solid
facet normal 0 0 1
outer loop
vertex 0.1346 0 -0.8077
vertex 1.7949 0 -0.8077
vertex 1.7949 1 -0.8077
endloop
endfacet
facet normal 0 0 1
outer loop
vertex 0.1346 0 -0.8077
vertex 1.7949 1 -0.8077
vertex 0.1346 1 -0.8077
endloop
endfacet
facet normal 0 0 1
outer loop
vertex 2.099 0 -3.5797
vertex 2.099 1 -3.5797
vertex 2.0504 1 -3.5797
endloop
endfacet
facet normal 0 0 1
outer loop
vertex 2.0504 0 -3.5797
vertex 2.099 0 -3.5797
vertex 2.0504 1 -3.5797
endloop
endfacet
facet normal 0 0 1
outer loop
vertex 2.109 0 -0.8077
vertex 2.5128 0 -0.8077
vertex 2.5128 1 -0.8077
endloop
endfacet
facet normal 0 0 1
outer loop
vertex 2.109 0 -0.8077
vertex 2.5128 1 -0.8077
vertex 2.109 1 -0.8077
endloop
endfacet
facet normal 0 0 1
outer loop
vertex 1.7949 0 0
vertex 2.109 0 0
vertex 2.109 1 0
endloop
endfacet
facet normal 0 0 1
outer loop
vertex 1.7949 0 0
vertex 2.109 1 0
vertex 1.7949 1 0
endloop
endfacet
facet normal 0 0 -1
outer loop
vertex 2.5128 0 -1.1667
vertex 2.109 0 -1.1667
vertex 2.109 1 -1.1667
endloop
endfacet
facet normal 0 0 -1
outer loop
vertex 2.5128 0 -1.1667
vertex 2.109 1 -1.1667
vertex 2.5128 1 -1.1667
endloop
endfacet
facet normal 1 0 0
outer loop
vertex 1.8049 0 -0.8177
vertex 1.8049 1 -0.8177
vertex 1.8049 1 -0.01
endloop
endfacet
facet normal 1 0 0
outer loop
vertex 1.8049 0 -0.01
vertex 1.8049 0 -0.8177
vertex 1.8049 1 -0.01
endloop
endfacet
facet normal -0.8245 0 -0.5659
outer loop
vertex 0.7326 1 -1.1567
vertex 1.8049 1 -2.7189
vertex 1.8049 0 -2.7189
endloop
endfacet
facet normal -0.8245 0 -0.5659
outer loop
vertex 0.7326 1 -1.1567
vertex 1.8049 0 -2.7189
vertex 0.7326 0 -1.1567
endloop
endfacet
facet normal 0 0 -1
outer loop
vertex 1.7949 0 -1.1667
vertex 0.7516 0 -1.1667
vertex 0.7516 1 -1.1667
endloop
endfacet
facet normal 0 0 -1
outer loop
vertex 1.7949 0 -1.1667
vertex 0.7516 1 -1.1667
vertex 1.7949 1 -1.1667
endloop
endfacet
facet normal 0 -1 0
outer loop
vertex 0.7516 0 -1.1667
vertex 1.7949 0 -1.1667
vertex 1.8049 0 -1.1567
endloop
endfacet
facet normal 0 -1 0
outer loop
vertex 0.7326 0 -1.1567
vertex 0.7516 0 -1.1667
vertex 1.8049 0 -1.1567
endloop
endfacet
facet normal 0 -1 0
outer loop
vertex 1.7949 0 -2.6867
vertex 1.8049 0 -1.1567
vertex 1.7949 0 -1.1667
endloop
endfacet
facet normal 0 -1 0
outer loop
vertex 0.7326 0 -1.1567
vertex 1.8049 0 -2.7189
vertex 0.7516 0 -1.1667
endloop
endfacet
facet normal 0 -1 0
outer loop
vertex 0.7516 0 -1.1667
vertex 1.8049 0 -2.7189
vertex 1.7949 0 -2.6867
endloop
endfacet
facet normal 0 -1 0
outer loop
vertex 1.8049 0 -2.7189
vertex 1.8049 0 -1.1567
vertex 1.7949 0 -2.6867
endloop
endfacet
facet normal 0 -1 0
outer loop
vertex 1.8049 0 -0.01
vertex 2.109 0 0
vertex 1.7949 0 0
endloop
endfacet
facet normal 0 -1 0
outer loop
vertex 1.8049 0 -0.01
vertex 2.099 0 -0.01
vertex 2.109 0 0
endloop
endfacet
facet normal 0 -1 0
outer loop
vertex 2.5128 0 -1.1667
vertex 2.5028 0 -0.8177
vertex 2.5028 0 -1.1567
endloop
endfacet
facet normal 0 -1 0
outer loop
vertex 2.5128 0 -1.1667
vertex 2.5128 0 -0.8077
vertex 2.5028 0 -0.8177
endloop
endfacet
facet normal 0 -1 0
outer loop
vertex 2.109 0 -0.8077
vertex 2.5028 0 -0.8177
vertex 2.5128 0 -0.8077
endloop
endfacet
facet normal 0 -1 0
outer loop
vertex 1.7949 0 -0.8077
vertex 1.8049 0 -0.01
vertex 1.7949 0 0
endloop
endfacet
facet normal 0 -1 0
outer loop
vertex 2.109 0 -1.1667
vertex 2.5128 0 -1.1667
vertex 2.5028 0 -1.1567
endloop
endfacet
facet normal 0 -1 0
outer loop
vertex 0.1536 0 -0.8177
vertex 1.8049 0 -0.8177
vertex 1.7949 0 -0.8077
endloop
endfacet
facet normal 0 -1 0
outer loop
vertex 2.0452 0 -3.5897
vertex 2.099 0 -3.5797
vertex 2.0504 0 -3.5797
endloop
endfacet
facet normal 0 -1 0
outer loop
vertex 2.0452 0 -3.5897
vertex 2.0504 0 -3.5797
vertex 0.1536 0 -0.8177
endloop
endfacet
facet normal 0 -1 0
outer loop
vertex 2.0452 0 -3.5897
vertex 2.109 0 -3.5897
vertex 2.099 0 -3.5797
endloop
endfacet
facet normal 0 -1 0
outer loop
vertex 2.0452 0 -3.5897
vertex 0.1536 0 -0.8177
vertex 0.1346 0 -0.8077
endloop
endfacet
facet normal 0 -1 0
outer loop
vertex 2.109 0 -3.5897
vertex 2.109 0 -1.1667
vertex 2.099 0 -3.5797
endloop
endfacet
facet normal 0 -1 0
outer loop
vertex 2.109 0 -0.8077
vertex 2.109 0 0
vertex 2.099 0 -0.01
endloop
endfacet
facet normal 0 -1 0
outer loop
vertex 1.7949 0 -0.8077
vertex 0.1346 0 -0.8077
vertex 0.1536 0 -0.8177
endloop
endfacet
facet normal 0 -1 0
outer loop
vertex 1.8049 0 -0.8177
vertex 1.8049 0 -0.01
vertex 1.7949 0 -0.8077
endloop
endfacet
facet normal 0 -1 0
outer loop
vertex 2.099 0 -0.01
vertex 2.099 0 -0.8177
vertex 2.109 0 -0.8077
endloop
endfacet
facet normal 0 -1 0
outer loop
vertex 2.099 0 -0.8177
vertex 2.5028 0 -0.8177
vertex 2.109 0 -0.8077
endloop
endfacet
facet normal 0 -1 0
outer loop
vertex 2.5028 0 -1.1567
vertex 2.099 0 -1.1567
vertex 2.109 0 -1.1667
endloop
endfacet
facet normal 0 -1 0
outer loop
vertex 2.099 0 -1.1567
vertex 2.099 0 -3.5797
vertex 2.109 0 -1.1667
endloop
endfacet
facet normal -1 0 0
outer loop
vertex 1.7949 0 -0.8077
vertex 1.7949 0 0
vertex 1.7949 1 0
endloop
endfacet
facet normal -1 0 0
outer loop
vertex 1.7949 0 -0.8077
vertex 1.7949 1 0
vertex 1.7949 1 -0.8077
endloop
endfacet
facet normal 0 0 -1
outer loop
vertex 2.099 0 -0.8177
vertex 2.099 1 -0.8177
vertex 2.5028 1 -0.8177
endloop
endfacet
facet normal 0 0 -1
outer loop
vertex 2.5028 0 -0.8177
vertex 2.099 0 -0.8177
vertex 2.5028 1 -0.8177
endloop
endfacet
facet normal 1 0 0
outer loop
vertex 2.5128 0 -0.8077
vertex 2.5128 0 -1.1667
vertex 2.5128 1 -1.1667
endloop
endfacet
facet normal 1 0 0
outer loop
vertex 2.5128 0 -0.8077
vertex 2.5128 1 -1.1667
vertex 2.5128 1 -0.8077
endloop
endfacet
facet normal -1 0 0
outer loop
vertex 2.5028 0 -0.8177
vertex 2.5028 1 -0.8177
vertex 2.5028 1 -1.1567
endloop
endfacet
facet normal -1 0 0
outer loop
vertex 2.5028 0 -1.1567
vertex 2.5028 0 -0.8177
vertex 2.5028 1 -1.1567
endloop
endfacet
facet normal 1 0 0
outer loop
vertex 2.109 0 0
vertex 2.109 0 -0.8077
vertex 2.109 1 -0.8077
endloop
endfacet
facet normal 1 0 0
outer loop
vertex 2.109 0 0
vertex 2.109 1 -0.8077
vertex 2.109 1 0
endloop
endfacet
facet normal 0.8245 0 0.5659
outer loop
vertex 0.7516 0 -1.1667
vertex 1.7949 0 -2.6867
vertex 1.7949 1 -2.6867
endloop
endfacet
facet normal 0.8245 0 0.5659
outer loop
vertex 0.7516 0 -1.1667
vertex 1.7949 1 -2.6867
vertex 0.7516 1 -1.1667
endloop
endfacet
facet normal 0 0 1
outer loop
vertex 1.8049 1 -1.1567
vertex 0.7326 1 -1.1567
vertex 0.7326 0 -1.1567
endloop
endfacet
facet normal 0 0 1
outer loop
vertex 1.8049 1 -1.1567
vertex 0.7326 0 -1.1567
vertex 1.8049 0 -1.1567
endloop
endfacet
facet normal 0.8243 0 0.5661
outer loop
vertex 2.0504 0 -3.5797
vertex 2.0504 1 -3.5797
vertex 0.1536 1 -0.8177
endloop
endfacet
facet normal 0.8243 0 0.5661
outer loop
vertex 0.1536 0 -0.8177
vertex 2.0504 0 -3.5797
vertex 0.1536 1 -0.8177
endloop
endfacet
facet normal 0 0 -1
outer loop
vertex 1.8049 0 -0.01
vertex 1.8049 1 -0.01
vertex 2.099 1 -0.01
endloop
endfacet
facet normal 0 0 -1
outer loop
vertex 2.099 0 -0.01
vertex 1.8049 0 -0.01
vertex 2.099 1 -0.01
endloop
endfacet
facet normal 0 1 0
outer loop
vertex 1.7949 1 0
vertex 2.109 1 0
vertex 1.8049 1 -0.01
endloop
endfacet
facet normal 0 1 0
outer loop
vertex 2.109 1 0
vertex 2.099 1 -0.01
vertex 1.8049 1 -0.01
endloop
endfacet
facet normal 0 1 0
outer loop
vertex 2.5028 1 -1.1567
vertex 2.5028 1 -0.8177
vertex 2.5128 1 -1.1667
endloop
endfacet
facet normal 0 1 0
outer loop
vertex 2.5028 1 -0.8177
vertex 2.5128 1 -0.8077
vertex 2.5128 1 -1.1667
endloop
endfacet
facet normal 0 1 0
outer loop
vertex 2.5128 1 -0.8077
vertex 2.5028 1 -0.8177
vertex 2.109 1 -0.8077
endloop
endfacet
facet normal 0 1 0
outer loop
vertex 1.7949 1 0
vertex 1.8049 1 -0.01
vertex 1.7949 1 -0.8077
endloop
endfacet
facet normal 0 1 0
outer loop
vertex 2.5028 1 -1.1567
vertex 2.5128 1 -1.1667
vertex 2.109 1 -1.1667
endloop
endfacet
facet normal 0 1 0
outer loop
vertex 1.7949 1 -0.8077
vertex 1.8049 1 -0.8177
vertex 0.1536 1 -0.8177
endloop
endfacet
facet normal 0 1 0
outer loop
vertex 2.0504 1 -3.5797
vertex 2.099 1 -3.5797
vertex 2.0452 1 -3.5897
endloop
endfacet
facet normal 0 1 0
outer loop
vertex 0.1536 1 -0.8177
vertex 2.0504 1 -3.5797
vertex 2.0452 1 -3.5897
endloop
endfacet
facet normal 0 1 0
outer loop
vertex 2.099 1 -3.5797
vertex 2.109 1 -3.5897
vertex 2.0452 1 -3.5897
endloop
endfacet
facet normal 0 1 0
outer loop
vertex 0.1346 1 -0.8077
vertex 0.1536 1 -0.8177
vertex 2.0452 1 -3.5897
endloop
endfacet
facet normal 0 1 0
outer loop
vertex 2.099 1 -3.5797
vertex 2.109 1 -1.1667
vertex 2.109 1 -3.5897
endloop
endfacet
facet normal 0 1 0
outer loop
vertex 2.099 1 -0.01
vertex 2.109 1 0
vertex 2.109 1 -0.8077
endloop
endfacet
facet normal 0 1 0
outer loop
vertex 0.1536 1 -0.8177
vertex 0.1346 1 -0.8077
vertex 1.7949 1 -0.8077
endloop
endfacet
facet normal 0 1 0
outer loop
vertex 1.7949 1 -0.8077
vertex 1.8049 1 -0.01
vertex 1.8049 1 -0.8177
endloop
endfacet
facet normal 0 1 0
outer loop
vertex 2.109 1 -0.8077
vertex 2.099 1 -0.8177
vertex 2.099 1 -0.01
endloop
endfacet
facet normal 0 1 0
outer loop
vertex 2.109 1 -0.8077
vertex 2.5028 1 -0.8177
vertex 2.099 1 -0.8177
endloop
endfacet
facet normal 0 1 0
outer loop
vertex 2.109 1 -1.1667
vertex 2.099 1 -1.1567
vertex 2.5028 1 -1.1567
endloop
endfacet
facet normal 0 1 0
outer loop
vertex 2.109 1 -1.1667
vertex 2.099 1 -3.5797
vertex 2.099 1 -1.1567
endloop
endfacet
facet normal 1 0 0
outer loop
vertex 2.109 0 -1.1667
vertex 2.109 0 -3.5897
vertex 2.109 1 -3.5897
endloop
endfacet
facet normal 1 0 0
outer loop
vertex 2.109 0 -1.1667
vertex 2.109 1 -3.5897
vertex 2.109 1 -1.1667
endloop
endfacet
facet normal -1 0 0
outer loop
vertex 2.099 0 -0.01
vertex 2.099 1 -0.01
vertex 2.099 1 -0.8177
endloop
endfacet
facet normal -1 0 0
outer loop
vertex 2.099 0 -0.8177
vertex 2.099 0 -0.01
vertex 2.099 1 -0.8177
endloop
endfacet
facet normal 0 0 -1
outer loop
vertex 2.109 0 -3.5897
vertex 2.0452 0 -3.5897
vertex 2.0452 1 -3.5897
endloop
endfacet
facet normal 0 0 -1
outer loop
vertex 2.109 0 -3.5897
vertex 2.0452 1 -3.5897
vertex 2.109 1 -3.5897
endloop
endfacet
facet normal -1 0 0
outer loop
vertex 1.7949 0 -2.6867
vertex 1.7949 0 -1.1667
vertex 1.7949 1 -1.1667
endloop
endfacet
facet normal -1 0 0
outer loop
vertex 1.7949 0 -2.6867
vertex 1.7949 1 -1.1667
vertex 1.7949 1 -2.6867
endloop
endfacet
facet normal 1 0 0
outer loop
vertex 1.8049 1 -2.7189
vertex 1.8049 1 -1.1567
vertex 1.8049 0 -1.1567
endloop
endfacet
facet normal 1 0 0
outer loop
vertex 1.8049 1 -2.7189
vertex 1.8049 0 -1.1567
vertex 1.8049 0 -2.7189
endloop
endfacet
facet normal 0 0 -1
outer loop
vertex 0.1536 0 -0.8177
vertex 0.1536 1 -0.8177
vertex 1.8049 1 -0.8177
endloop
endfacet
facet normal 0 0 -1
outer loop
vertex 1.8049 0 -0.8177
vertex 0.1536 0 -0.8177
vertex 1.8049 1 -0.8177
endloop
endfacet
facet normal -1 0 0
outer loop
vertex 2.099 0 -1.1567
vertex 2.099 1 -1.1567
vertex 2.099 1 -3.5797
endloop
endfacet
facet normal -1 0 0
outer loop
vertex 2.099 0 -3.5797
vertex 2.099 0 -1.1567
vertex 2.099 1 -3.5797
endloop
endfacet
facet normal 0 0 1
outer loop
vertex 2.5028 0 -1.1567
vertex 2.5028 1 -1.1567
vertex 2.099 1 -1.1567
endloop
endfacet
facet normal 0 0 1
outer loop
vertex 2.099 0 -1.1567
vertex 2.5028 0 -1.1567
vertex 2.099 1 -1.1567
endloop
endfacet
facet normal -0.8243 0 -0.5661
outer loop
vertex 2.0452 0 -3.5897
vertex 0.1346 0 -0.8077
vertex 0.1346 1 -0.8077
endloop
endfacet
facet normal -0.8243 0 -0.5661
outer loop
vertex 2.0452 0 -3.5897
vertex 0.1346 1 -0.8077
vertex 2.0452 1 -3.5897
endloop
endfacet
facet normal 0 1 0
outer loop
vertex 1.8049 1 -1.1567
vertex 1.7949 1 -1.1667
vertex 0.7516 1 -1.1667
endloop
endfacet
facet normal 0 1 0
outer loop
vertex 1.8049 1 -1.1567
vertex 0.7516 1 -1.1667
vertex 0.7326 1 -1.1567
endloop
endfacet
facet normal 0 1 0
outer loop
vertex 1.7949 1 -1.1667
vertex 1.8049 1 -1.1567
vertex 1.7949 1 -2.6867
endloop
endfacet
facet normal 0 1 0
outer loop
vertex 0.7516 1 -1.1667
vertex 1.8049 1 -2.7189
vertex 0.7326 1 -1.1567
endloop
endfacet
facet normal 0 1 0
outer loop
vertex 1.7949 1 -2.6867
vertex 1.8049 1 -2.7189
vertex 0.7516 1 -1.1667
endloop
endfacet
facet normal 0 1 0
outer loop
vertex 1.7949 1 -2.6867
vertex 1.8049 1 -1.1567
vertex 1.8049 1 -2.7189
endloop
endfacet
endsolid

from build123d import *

# Parameters (mm, degrees)
BOSS_EXTRUDE1_DEPTH = 1
CUT_EXTRUDE2_DEPTH  = 1


with BuildPart() as part:
    # Sketch1 → Boss-Extrude1 (new body)
    with BuildSketch(Plane(origin=(0, 0, 0), x_dir=(1, 0, 0), z_dir=(0, 1, 0))):
        Polygon((2.045172276, 3.58974359), (2.108974359, 3.58974359), (2.108974359, 1.166666667), (2.512820513, 1.166666667), (2.512820513, 0.807692308), (2.108974359, 0.807692308), (2.108974359, 0), (1.794871795, 0), (1.794871795, 0.807692308), (0.134615385, 0.807692308), align=None)
        Polygon((1.794871795, 1.166666667), (1.794871795, 2.686698718), (0.751602564, 1.166666667), align=None, mode=Mode.SUBTRACT)
    extrude(amount=BOSS_EXTRUDE1_DEPTH)

    # Sketch2 → Cut-Extrude2 (cut)
    with BuildSketch(Plane(origin=(0, 1, 0), x_dir=(1, 0, 0), z_dir=(0, 1, 0))):
        Polygon((2.050435859, 3.57974359), (0.153613847, 0.817692308), (1.804871795, 0.817692308), (1.804871795, 0.01), (2.098974359, 0.01), (2.098974359, 0.817692308), (2.502820513, 0.817692308), (2.502820513, 1.156666667), (2.098974359, 1.156666667), (2.098974359, 3.57974359), align=None)
        Polygon((0.73261032, 1.156666667), (1.804871795, 1.156666667), (1.804871795, 2.718940106), align=None, mode=Mode.SUBTRACT)
    extrude(amount=-CUT_EXTRUDE2_DEPTH, mode=Mode.SUBTRACT)


solid = part.part
